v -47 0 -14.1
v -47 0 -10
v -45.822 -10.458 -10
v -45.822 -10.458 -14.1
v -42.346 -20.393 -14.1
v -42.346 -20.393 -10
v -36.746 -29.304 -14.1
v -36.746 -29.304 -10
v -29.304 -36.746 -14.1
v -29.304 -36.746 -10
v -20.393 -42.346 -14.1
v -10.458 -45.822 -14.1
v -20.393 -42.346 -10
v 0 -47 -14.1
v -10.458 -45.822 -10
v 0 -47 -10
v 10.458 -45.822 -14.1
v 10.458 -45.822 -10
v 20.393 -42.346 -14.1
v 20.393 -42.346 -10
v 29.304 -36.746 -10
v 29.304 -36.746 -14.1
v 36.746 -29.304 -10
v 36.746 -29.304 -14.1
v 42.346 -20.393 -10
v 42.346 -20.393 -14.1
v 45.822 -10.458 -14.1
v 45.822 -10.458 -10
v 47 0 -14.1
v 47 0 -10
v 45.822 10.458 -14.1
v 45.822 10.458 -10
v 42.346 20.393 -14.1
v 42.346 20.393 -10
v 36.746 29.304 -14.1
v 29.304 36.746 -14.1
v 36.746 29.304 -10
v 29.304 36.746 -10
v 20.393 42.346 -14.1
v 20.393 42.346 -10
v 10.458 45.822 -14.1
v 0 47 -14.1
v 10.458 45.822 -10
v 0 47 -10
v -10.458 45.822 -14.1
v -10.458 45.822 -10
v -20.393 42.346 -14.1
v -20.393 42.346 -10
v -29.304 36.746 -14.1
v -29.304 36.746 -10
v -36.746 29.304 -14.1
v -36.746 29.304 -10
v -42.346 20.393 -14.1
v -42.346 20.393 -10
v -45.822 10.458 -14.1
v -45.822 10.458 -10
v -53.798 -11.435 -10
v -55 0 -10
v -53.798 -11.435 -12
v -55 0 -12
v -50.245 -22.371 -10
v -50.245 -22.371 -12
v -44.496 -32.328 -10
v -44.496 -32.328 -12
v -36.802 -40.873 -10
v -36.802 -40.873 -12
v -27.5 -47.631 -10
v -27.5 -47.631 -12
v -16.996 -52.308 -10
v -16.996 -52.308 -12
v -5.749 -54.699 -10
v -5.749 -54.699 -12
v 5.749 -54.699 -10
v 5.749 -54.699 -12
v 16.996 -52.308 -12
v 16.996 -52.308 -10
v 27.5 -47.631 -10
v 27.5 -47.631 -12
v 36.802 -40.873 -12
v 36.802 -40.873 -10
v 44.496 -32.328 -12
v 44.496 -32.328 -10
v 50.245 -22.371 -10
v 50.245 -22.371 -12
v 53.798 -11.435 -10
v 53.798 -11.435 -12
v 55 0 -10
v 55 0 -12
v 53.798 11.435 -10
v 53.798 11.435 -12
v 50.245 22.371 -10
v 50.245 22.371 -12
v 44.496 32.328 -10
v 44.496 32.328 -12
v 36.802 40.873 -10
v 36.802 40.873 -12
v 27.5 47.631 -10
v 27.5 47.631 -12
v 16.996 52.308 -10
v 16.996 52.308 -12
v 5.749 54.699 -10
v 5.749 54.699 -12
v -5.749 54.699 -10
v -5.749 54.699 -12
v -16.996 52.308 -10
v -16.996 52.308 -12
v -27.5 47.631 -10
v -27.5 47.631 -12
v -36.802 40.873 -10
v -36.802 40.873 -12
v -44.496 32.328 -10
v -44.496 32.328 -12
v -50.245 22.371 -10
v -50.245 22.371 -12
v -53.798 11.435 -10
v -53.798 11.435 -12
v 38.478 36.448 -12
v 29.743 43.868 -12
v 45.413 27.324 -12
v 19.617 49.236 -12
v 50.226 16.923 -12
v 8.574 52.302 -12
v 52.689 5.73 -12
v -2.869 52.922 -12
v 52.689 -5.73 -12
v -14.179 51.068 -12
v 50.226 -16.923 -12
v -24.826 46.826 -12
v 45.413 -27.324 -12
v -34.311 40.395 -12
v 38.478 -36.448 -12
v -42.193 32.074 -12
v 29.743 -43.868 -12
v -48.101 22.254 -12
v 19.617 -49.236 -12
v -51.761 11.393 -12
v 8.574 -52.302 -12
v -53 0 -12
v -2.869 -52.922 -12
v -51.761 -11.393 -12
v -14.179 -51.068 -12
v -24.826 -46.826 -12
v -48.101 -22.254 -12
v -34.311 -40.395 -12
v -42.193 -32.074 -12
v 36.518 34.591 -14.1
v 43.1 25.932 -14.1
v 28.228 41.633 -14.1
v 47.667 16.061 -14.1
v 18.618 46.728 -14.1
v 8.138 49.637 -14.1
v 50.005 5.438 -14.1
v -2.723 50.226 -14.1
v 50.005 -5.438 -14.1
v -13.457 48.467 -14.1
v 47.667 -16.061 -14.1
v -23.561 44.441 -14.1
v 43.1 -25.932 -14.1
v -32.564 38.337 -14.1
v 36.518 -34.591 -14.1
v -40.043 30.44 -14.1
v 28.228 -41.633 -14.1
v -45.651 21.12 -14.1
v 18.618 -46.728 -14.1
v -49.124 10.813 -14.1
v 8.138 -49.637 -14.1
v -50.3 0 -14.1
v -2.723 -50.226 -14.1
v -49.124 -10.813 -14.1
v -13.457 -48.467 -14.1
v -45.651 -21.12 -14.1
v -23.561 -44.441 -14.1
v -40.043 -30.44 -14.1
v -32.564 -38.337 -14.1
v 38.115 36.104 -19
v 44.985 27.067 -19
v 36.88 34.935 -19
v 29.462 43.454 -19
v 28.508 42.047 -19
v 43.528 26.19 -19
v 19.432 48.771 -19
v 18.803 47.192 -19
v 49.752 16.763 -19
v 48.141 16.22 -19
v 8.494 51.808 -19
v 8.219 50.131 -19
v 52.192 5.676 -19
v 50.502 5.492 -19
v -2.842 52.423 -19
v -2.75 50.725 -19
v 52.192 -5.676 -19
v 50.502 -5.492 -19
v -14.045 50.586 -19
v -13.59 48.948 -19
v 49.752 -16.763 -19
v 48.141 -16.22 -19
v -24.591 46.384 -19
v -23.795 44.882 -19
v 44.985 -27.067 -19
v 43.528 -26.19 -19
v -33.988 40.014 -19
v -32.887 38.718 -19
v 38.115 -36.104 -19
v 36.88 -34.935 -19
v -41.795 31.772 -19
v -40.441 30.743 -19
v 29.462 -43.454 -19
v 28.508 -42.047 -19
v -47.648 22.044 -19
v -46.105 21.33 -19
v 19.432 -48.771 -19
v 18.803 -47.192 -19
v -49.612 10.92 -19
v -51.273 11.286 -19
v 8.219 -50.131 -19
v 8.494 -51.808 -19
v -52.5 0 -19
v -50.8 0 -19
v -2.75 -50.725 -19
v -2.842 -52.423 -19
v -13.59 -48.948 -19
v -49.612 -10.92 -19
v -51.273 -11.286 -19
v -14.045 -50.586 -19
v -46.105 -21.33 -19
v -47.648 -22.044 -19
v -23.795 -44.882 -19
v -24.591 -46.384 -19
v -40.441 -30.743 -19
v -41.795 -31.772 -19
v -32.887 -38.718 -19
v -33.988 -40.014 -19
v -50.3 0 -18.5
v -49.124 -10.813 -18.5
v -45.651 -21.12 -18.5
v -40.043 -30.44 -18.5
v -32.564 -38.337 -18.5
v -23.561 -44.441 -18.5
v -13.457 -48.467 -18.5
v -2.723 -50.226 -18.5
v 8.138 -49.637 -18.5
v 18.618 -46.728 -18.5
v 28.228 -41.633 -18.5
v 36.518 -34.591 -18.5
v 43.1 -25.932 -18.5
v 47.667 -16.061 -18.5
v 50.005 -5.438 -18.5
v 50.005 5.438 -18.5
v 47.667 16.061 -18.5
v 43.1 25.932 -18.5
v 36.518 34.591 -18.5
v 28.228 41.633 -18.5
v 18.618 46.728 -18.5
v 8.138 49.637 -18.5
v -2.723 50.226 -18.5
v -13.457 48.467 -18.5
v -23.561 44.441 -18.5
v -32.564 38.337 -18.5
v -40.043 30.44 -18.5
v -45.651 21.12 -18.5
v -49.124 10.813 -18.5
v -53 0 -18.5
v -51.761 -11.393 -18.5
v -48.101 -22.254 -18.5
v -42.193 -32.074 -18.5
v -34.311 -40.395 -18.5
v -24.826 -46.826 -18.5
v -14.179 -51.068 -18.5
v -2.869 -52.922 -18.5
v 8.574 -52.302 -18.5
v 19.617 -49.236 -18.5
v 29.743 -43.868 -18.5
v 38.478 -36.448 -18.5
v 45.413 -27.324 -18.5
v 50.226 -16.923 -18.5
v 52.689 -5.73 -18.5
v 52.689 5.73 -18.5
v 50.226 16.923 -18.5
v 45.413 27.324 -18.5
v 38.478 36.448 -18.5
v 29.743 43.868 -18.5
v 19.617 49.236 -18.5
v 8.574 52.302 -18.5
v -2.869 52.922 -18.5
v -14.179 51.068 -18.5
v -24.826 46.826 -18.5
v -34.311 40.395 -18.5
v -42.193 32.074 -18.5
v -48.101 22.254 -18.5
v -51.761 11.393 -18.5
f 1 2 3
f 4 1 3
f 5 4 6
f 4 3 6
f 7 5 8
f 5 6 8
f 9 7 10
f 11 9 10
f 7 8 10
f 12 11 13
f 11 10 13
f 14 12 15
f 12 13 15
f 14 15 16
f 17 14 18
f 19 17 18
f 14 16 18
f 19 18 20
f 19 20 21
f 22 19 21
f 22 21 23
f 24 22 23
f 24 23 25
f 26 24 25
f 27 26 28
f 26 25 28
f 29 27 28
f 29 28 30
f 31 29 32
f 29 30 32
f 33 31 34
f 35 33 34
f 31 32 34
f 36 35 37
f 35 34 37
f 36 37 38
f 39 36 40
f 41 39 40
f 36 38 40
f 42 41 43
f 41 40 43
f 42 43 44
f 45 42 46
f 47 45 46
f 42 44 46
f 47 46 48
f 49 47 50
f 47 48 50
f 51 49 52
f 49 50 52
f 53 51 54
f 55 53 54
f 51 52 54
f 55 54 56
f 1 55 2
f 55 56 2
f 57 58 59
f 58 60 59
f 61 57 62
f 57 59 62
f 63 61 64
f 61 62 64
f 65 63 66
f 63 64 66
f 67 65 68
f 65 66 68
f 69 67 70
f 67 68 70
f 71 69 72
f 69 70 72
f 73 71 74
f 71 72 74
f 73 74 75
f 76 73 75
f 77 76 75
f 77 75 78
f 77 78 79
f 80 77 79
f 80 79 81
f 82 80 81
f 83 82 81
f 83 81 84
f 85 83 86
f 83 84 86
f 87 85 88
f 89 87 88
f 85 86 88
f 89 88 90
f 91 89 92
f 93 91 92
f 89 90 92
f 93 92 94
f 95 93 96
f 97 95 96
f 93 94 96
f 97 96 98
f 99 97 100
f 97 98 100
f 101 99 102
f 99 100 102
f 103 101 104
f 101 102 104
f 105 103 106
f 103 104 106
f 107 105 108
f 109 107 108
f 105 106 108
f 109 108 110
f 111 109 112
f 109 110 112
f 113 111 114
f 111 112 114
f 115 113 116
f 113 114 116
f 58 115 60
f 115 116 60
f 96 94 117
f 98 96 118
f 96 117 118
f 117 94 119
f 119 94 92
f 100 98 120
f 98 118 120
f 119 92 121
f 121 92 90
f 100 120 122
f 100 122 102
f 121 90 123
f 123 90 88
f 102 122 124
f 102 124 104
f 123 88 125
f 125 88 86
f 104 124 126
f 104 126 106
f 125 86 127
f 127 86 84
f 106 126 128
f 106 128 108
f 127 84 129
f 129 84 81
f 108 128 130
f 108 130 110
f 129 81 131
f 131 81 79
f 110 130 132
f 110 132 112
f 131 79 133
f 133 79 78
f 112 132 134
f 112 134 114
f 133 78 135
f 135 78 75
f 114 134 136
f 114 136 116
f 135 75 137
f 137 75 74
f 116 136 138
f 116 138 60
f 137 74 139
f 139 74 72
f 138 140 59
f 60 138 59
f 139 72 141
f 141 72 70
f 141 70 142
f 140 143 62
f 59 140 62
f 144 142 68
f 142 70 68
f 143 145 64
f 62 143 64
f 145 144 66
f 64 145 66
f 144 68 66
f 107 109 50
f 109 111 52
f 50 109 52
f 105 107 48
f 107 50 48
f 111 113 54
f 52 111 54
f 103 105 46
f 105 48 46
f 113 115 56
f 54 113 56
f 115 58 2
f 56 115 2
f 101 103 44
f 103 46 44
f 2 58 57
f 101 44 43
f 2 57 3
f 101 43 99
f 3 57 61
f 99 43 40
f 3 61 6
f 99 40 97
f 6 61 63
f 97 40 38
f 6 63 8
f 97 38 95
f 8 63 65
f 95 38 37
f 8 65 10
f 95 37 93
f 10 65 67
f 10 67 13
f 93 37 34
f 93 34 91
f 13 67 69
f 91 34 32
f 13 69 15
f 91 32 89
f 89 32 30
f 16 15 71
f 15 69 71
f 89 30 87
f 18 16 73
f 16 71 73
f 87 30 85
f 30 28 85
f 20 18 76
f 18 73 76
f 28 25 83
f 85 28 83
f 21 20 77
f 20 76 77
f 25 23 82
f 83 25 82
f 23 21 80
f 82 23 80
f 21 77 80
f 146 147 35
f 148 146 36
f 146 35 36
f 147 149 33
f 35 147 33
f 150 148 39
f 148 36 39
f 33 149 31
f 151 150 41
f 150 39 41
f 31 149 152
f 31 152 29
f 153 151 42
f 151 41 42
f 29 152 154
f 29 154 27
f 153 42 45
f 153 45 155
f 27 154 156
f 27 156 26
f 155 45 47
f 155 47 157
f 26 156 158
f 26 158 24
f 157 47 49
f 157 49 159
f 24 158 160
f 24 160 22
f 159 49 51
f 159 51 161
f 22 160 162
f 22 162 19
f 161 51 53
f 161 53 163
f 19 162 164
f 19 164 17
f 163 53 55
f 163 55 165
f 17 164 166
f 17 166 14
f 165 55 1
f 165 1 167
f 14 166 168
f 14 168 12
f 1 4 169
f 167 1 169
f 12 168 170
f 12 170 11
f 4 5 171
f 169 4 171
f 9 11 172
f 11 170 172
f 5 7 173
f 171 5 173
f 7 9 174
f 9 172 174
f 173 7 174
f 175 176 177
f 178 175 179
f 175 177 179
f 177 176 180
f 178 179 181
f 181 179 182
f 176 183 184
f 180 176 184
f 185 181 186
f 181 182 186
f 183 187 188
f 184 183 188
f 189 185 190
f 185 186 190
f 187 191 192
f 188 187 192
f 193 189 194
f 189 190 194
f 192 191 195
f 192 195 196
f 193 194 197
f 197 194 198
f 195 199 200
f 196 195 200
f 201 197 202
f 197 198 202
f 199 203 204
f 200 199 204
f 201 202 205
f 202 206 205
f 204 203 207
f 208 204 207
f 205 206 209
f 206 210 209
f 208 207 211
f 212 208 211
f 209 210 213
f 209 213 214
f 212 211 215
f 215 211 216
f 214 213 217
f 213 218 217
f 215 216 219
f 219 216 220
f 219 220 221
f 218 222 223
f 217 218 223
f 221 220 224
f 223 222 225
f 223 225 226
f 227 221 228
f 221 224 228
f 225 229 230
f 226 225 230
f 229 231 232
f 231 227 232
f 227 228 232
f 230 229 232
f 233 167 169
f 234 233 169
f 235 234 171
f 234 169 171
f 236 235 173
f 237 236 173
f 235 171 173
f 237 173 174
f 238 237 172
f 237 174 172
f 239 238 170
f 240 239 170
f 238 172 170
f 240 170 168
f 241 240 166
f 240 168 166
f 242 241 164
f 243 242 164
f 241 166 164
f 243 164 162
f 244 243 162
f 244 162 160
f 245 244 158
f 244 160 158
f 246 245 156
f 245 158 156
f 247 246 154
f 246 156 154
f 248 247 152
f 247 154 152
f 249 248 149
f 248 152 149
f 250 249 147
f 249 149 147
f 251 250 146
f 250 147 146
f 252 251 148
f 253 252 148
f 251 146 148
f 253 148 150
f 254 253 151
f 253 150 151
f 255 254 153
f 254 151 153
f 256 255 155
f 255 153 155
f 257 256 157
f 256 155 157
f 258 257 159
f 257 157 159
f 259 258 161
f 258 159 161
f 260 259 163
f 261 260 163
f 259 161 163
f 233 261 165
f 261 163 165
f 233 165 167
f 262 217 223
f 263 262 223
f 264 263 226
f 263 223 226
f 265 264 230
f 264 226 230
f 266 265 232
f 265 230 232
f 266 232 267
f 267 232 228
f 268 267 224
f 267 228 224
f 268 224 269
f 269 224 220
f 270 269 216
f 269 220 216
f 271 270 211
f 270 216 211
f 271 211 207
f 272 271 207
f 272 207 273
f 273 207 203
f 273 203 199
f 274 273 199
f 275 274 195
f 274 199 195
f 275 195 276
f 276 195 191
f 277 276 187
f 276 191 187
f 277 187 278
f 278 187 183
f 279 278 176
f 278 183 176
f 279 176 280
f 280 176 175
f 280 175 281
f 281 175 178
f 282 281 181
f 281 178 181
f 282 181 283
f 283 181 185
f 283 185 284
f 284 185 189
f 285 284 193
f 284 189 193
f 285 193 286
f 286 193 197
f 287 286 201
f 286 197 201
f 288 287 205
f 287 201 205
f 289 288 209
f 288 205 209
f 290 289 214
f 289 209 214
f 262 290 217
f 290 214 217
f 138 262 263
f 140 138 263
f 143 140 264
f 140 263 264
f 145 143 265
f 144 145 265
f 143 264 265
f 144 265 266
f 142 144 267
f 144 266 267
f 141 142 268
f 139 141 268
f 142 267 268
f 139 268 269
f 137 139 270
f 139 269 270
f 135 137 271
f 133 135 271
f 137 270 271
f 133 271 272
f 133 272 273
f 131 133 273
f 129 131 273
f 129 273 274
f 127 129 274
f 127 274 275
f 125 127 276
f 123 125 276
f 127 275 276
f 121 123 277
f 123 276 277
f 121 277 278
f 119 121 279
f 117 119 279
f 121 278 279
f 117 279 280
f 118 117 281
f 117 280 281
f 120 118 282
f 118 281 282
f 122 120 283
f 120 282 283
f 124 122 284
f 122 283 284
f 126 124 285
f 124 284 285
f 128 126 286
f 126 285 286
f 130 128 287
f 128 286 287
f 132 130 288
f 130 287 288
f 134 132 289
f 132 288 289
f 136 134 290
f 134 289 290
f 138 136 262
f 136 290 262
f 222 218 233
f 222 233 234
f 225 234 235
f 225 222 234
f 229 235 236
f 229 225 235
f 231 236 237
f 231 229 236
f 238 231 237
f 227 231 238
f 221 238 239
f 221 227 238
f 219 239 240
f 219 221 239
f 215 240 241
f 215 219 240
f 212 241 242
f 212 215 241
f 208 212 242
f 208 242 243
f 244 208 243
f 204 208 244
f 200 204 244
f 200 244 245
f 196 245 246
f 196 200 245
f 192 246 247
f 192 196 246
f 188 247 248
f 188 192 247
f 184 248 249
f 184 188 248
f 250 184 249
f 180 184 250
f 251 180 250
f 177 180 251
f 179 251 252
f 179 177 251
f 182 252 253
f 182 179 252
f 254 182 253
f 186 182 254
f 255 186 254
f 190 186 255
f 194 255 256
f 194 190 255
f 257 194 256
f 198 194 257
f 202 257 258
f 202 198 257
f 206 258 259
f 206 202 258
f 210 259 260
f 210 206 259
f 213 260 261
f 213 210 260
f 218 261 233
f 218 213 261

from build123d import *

# Parameters (mm, degrees)
CHAMFER1_SIZE           = 0.5
CUT_EXTRUDE1_DEPTH      = 81.068720484
CUT_EXTRUDE1_DEPTH_BACK = 81.068720484
SKETCH2_W               = 110.89778328
SKETCH2_H               = 14.994305345


with BuildPart() as part:
    # Sketch1 → Revolve1 (revolve)
    with BuildSketch(Plane(origin=(0, 0, 0), x_dir=(1, 0, 0), z_dir=(0, 1, 0)), mode=Mode.PRIVATE) as revolve1_sk:
        Polygon((50.3, 19), (50.3, 14.1), (47, 14.1), (47, 0), (49, 0), (49, 2.5), (48, 2.5), (48, 7.5), (49, 7.5), (49, 10), (55, 10), (55, 12), (53, 12), (53, 19), align=None)
    revolve(revolve1_sk.sketch.rotate(Axis((0, 0, -69.169847328), (0, 0, 1)), 180), axis=Axis((0, 0, -69.169847328), (0, 0, 1)))

    # Chamfer1
    chamfer1_edges = [part.edges().sort_by_distance(p)[0] for p in [
        (49, 0, -10),
        (49, 0, -7.5),
        (48, 0, -7.5),
        (48, 0, -2.5),
        (49, 0, -2.5),
        (49, 0, 0),
        (50.3, 0, -19),
        (53, 0, -19),
    ]]
    chamfer(chamfer1_edges, length=CHAMFER1_SIZE - 0.0001)  # a hair under: the kernel refuses the full size

    # Sketch2 → Cut-Extrude1 (cut, two sides: drawn at the far end of the back side and taken through both)
    with BuildSketch(Plane(origin=(0, 0, 0), x_dir=(1, 0, 0), z_dir=(0, 1, 0)).offset(-CUT_EXTRUDE1_DEPTH_BACK)):
        with Locations((0.44889164, 2.502847328)):
            Rectangle(SKETCH2_W, SKETCH2_H)
    extrude(amount=CUT_EXTRUDE1_DEPTH + CUT_EXTRUDE1_DEPTH_BACK, mode=Mode.SUBTRACT)


solid = part.part
